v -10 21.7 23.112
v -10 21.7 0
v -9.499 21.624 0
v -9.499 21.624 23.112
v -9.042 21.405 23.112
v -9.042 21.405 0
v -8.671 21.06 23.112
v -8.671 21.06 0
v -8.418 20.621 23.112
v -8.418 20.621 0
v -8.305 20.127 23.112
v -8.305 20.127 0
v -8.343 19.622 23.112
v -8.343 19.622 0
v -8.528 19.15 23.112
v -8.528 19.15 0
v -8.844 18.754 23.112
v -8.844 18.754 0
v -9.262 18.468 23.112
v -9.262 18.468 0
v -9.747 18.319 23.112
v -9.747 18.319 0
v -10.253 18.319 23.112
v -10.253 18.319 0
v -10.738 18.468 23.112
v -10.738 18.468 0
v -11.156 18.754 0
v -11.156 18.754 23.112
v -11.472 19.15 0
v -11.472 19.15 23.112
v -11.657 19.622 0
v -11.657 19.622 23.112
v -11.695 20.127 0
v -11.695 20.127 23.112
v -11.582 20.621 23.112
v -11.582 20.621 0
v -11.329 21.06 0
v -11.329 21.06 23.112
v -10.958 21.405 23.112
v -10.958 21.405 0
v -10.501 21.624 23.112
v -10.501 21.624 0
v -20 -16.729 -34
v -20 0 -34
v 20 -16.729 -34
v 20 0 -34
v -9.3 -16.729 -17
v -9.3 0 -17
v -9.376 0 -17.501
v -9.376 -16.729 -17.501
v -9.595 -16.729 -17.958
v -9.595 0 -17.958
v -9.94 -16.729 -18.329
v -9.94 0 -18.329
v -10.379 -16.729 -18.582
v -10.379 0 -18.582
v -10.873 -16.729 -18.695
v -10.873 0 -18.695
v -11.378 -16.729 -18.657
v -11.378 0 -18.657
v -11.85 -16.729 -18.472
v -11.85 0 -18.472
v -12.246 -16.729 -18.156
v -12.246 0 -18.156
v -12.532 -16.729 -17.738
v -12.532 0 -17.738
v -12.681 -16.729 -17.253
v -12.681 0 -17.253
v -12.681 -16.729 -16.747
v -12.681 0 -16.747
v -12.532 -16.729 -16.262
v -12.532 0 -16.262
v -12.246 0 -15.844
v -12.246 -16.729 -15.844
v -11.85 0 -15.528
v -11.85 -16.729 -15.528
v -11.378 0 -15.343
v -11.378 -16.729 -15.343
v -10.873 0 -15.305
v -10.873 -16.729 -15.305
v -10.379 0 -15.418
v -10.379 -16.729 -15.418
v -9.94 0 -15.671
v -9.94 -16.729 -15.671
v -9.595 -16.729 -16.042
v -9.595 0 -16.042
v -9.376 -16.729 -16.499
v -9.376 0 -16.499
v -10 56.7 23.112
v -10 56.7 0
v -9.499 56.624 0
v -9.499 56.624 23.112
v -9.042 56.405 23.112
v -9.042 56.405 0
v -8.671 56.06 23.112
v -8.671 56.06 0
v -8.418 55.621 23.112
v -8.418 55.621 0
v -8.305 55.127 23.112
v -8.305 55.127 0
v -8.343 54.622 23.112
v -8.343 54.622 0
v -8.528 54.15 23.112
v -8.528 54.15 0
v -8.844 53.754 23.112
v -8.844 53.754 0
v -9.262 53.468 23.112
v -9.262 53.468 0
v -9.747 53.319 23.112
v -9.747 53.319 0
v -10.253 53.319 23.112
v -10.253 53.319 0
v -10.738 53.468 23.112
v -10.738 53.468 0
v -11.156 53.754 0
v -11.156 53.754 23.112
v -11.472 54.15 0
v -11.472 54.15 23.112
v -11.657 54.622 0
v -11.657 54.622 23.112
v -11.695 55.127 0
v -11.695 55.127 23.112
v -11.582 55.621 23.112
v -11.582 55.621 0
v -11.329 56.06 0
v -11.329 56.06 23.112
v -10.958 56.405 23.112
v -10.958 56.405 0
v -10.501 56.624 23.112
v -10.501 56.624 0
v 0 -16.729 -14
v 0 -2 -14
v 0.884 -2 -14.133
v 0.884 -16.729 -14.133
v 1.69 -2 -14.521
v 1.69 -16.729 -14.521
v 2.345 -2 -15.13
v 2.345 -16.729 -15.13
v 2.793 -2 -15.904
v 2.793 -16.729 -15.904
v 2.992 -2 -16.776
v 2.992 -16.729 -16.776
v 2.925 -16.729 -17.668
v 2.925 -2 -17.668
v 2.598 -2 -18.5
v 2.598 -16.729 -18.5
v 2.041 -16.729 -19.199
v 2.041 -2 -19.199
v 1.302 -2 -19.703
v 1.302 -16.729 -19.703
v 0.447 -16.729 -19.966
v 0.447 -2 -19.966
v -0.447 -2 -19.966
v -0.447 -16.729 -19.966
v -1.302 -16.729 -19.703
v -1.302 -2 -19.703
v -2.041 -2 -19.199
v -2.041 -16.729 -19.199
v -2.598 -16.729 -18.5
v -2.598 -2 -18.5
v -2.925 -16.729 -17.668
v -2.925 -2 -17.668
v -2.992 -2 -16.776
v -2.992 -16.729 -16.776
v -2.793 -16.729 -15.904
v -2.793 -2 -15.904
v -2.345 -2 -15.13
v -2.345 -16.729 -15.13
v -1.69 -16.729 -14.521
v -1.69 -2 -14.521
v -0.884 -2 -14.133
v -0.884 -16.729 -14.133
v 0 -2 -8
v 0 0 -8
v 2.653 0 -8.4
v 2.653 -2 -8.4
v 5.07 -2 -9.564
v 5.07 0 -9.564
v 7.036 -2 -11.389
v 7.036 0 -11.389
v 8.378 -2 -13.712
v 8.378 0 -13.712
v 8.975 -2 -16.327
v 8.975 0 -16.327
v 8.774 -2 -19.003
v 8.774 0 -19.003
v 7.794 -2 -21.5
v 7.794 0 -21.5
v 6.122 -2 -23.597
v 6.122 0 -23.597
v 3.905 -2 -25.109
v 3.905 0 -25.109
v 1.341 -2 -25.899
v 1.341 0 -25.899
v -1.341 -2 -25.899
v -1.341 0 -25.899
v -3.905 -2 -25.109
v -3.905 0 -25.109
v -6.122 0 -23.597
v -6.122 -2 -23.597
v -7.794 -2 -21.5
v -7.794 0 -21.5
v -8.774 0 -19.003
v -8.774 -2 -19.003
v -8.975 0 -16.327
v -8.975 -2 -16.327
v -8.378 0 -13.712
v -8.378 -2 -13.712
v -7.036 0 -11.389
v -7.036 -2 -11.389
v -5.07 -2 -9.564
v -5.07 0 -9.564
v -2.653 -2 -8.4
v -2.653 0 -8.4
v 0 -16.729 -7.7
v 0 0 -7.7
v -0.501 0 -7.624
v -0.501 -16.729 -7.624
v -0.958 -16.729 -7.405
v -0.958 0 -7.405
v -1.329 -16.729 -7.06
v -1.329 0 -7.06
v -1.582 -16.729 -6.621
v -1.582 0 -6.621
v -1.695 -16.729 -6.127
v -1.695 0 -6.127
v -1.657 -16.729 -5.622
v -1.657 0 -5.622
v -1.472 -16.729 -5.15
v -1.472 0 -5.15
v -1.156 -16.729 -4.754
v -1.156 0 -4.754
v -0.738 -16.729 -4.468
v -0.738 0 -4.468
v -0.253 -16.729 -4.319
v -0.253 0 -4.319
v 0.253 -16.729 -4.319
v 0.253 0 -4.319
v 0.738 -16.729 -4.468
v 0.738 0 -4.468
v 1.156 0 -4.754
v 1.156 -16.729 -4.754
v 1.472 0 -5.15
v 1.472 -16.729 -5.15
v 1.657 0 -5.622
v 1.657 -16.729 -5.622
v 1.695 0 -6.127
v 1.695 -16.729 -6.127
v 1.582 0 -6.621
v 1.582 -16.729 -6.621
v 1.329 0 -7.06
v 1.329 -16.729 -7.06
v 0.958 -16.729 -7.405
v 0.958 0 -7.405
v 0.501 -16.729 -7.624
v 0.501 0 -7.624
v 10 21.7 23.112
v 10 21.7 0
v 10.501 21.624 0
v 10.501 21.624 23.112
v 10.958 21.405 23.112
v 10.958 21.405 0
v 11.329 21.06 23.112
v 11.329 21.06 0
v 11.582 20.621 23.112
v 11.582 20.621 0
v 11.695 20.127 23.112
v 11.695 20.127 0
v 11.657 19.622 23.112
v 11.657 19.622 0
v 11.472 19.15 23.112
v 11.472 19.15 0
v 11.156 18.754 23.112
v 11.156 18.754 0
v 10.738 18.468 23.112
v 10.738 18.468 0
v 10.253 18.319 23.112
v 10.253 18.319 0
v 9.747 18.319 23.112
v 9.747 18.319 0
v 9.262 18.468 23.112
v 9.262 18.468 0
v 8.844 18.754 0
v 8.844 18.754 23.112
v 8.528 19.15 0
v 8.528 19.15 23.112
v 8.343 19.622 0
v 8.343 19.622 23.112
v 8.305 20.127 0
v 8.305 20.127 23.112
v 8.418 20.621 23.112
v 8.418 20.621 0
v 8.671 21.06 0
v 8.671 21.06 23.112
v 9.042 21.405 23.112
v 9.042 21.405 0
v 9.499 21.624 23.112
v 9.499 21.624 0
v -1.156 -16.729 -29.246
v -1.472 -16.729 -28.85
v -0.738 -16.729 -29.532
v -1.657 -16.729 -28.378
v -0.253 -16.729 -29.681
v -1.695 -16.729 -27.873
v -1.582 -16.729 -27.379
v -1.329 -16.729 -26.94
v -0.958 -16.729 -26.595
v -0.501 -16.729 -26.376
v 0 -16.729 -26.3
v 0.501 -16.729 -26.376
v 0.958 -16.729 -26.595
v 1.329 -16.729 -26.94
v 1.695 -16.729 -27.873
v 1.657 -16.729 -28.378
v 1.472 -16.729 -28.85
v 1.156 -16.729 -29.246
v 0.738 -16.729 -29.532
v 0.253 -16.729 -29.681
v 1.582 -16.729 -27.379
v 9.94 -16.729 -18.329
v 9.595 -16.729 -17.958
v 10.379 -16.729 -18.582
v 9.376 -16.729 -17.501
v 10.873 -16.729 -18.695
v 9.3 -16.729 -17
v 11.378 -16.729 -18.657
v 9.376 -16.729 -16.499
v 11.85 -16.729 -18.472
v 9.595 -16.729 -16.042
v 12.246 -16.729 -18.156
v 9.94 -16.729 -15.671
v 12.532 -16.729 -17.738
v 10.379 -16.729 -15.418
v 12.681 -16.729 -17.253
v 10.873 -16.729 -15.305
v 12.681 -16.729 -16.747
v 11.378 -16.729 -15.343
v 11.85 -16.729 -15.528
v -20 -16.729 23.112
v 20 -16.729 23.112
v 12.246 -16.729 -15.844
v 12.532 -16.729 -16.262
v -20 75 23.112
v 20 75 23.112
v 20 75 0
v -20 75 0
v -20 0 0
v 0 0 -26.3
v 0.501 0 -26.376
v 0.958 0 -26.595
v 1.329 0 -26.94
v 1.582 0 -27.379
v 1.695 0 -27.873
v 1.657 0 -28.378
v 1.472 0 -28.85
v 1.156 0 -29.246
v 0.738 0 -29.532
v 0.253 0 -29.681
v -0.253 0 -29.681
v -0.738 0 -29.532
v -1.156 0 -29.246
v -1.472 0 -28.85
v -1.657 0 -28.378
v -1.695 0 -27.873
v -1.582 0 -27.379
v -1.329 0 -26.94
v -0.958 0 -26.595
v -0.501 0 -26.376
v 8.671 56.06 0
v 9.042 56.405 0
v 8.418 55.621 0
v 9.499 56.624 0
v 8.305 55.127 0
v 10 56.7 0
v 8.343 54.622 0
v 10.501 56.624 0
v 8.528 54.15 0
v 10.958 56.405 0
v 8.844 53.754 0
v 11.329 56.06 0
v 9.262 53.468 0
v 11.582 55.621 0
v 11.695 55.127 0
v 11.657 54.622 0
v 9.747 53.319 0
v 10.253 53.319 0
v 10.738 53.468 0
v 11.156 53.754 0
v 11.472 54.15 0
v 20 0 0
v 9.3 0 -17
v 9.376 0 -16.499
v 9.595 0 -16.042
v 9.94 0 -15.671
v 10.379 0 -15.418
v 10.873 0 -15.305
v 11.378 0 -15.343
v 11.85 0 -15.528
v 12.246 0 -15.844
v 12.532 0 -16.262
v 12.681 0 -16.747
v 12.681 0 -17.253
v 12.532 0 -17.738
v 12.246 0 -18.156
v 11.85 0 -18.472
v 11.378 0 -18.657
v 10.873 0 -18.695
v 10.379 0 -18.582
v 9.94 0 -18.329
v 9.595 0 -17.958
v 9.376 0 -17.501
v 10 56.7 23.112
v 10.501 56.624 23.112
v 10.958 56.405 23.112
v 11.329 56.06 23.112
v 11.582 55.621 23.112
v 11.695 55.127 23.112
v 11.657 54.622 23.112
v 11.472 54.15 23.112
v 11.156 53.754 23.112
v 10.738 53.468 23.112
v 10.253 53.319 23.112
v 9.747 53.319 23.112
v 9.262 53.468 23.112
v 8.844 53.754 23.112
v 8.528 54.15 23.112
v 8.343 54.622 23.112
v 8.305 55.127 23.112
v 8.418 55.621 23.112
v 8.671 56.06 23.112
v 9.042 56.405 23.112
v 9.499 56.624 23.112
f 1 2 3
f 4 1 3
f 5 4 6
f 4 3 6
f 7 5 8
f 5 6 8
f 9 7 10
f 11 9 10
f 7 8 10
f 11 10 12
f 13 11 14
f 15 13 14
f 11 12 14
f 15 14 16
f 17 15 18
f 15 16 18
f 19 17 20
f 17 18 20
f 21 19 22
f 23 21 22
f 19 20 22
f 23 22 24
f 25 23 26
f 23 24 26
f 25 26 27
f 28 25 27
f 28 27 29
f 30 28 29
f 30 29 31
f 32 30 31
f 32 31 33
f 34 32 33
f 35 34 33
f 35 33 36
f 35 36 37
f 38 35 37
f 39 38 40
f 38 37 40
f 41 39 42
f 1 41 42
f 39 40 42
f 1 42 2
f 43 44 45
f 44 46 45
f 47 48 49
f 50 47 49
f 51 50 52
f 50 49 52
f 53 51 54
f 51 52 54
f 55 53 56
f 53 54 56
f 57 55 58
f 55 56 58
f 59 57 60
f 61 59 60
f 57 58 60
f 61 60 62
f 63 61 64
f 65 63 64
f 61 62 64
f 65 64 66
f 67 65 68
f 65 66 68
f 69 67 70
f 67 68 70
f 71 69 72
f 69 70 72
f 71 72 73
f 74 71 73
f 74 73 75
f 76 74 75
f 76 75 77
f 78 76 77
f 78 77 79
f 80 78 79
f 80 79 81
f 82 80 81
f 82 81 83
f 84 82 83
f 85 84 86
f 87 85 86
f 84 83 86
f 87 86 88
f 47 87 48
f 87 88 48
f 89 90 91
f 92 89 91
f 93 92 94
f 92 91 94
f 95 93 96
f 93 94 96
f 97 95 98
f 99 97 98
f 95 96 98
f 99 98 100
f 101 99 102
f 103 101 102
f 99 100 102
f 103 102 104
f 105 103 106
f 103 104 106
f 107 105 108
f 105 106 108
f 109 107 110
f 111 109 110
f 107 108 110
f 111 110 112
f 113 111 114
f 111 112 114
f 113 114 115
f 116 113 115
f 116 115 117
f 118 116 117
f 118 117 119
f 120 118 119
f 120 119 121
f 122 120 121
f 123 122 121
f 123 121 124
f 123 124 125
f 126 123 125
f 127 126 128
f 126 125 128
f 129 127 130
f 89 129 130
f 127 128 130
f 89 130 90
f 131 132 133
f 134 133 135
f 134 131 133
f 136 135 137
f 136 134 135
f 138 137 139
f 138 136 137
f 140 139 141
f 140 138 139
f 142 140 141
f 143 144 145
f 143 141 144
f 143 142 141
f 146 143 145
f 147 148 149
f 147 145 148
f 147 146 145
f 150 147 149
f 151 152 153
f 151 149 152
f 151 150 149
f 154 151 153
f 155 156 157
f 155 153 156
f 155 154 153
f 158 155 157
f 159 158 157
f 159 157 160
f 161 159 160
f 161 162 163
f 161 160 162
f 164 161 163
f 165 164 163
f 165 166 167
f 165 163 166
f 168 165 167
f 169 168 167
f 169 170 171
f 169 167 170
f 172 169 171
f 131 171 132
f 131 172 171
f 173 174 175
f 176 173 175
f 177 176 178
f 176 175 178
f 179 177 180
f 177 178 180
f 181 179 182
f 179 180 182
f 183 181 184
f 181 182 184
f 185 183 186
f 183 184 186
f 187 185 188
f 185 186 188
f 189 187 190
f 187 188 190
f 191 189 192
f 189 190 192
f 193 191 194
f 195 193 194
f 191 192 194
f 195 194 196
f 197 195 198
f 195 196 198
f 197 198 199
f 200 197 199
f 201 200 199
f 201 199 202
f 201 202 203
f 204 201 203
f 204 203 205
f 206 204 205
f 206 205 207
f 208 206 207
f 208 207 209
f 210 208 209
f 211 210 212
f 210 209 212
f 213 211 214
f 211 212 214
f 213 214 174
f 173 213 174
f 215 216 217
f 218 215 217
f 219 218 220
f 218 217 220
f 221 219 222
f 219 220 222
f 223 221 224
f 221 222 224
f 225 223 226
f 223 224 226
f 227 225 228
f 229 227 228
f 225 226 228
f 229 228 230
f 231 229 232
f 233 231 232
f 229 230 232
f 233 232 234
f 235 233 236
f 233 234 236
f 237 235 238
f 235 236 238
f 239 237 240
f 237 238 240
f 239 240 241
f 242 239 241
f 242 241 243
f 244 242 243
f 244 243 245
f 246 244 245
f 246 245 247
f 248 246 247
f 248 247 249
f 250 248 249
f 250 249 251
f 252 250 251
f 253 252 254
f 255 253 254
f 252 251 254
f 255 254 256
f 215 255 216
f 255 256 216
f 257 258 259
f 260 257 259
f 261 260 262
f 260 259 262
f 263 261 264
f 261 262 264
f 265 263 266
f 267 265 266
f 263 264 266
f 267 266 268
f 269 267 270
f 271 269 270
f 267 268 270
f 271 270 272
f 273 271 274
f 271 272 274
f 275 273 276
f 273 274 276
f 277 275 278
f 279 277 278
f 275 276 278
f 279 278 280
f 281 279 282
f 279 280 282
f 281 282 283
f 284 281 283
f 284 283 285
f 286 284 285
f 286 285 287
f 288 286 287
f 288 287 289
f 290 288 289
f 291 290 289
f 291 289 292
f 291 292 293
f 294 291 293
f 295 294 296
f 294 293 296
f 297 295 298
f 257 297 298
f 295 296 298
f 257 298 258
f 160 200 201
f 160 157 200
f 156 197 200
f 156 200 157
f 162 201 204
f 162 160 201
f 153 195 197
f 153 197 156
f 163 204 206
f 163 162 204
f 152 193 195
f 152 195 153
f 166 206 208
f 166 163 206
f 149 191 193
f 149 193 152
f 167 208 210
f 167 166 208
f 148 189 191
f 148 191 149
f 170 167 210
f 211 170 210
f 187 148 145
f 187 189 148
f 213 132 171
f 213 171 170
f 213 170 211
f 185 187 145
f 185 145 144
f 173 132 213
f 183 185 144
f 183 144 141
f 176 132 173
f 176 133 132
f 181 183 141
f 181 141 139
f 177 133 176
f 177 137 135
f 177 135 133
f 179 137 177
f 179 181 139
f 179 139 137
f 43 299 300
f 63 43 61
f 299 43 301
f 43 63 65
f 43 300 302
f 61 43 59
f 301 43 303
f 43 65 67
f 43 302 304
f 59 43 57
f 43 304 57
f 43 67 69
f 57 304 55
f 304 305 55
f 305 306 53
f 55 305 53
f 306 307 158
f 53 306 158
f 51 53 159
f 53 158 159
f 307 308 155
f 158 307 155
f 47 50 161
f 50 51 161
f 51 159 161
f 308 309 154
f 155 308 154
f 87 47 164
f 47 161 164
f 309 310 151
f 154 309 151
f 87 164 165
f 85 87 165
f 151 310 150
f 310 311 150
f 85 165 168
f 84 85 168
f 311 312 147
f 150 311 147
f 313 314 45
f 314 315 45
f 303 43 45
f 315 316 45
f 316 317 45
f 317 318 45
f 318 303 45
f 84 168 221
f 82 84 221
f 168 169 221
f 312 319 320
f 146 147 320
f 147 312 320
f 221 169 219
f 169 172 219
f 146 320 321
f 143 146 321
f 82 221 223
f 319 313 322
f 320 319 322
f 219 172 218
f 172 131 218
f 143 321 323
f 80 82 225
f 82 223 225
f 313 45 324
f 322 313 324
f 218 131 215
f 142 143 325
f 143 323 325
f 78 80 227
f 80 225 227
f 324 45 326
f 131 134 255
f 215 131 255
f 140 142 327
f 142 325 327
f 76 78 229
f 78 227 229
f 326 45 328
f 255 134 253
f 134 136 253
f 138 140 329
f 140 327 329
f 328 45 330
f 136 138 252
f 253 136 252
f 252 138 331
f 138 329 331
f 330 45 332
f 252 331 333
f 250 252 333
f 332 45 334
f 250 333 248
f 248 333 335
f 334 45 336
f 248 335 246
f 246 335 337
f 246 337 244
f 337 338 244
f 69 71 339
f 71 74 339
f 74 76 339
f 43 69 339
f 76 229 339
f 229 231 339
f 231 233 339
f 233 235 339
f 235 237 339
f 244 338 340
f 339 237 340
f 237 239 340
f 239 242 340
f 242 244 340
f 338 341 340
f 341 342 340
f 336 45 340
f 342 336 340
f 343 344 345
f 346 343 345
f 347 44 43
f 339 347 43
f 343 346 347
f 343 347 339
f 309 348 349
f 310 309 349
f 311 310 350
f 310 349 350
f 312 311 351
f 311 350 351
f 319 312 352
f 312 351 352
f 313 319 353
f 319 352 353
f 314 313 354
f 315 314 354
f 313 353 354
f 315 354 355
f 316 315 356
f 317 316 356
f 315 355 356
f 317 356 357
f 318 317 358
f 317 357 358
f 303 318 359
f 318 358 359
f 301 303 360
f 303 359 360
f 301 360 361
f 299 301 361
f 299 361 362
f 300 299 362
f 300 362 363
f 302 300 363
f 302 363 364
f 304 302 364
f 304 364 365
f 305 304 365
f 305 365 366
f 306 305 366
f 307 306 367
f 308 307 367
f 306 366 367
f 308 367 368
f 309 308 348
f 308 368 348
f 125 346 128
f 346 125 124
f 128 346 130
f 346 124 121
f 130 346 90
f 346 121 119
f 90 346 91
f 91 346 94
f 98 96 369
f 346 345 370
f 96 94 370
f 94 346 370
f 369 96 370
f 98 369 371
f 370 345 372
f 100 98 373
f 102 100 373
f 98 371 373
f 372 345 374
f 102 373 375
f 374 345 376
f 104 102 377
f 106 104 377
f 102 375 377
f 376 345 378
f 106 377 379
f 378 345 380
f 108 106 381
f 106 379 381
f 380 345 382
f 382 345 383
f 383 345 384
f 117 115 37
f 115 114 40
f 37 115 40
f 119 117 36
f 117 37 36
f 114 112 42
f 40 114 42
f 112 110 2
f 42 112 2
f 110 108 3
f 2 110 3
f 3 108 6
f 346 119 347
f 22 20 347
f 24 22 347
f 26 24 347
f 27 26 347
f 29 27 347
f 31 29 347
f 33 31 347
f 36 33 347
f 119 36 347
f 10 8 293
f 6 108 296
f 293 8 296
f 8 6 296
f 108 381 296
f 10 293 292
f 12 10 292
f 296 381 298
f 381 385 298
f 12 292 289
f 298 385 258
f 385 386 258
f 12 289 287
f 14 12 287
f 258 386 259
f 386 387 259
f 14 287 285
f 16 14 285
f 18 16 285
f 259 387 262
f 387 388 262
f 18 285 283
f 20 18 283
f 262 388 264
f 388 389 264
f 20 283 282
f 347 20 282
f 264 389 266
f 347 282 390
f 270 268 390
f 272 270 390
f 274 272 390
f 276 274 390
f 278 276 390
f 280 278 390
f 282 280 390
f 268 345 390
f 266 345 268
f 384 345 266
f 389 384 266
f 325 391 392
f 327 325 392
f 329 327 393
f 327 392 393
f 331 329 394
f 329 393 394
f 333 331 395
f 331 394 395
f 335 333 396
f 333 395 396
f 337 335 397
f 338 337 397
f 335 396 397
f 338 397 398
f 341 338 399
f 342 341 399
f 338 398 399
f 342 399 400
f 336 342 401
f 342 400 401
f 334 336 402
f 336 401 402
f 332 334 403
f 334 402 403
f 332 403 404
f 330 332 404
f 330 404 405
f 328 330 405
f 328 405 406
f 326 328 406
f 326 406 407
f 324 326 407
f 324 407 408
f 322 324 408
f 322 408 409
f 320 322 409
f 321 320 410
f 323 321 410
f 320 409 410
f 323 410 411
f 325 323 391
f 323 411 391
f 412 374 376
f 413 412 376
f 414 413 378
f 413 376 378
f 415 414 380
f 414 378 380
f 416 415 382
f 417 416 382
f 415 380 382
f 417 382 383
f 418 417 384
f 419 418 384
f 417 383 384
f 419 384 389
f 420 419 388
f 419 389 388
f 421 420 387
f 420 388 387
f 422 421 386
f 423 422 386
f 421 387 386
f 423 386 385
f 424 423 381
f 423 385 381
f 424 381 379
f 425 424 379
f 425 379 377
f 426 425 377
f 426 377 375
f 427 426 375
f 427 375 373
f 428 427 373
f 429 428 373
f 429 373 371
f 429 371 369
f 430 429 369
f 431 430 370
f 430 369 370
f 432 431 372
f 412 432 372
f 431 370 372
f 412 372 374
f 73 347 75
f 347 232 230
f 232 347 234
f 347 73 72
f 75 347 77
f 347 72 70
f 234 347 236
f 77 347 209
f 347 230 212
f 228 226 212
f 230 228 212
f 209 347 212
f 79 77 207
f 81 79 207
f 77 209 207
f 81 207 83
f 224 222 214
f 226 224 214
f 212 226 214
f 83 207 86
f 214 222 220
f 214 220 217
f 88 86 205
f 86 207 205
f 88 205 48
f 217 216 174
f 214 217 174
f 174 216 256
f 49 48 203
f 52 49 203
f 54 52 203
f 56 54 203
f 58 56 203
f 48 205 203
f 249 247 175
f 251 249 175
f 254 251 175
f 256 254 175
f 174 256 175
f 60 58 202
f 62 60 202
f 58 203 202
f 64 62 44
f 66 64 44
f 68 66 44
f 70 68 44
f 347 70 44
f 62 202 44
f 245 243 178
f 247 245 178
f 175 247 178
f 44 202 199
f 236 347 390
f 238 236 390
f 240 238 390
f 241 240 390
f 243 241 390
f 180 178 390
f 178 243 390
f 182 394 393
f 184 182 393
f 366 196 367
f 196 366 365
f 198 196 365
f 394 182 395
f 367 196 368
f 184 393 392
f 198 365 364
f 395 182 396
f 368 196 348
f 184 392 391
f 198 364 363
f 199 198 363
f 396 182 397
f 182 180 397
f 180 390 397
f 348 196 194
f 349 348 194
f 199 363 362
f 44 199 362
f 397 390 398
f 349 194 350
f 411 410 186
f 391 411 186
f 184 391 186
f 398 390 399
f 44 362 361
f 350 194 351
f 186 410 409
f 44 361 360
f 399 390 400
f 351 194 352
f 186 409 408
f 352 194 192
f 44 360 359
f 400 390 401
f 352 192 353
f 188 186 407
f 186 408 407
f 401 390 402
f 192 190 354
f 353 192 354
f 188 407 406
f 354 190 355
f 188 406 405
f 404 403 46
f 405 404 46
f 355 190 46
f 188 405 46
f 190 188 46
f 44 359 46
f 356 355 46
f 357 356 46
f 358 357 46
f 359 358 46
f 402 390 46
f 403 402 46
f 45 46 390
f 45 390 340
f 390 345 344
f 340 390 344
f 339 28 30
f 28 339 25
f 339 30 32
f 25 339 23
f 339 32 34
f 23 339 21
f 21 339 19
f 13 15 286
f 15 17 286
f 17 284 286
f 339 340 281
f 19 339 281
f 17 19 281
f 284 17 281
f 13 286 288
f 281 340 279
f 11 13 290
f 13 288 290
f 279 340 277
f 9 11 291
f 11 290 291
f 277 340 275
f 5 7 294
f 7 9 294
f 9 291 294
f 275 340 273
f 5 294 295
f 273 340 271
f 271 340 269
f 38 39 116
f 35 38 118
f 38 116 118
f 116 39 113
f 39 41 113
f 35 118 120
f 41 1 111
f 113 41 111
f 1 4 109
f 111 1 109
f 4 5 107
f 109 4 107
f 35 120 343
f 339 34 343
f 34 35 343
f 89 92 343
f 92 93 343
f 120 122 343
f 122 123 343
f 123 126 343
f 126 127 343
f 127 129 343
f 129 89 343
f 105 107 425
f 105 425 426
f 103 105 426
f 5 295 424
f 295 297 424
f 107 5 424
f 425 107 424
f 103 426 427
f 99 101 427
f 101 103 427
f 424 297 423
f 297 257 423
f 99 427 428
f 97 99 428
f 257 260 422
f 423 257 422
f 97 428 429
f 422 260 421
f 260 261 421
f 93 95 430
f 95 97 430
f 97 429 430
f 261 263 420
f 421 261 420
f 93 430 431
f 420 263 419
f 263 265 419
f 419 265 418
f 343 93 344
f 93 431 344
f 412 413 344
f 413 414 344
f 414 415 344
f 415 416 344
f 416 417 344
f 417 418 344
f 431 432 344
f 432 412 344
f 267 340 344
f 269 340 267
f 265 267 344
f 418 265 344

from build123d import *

# Parameters (mm, degrees)
BOSS_EXTRUDE1_DEPTH  = 20
CUT_EXTRUDE2_START   = -16.729038
SKETCH3_R            = 3
CUT_EXTRUDE2_DEPTH   = 16.729038
SKETCH2_R            = 9
CUT_EXTRUDE1_DEPTH   = 2
SKETCH5_R            = 1.7
CUT_EXTRUDE3_DEPTH   = 16.729037413
CIRPATTERN1_COUNT    = 4
SKETCH6_R            = 1.7
CUT_EXTRUDE4_DEPTH   = 23.112367583
LPATTERN1_COUNT      = 2
LPATTERN1_PITCH      = 20
LPATTERN1_COUNT_DIR2 = 2
LPATTERN1_PITCH_DIR2 = 35


with BuildPart() as part:
    # Sketch1 → Boss-Extrude1 (new, symmetric)
    with BuildSketch(Plane(origin=(0, 0, 0), x_dir=(0, 0, -1), z_dir=(1, 0, 0))):
        Polygon((0, 0), (34, 0), (34, -16.729037413), (-23.112367583, -16.729037413), (-23.112367583, 75), (0, 75), align=None)
    extrude(amount=BOSS_EXTRUDE1_DEPTH, both=True)

    # Sketch3 → Cut-Extrude2 (cut)
    with BuildSketch(Plane(origin=(0, 0, 0), x_dir=(1, 0, 0), z_dir=(0, 1, 0)).offset(CUT_EXTRUDE2_START)):
        with Locations(Location((0, 17, 0), (0, 0, 270))):
            Circle(SKETCH3_R)
    extrude(amount=CUT_EXTRUDE2_DEPTH, mode=Mode.SUBTRACT)

    # Sketch2 → Cut-Extrude1 (cut)
    with BuildSketch(Plane(origin=(0, 0, 0), x_dir=(1, 0, 0), z_dir=(0, 1, 0))):
        with Locations(Location((0, 17, 0), (0, 0, 270))):
            Circle(SKETCH2_R)
    extrude(amount=-CUT_EXTRUDE1_DEPTH, mode=Mode.SUBTRACT)

    # Sketch5 → Cut-Extrude3 (cut)
    with BuildSketch(Plane(origin=(0, 0, 0), x_dir=(1, 0, 0), z_dir=(0, 1, 0))):
        with Locations(Location((0, 28, 0), (0, 0, 270))):
            Circle(SKETCH5_R)
    cut_extrude3 = extrude(amount=-CUT_EXTRUDE3_DEPTH, mode=Mode.SUBTRACT)

    # CirPattern1: Cut-Extrude3 ×4 about axis
    cirpattern1_axis = Axis((0, 0, -17), (0, 1, 0))
    for i in range(1, CIRPATTERN1_COUNT):
        add(cut_extrude3.rotate(cirpattern1_axis, i * 360 / CIRPATTERN1_COUNT), mode=Mode.SUBTRACT)

    # Sketch6 → Cut-Extrude4 (cut)
    with BuildSketch(Plane(origin=(0, 0, 0), x_dir=(-1, 0, 0), z_dir=(0, 0, -1))):
        with Locations(Location((10, 55, 0), (0, 0, 90))):
            Circle(SKETCH6_R)
    cut_extrude4 = extrude(amount=-CUT_EXTRUDE4_DEPTH, mode=Mode.SUBTRACT)

    # LPattern1: Cut-Extrude4 2 × 2
    with Locations(*[(i * LPATTERN1_PITCH, -j * LPATTERN1_PITCH_DIR2, 0) for i in range(LPATTERN1_COUNT) for j in range(LPATTERN1_COUNT_DIR2) if (i, j) != (0, 0)]):
        add(cut_extrude4, mode=Mode.SUBTRACT)


solid = part.part
